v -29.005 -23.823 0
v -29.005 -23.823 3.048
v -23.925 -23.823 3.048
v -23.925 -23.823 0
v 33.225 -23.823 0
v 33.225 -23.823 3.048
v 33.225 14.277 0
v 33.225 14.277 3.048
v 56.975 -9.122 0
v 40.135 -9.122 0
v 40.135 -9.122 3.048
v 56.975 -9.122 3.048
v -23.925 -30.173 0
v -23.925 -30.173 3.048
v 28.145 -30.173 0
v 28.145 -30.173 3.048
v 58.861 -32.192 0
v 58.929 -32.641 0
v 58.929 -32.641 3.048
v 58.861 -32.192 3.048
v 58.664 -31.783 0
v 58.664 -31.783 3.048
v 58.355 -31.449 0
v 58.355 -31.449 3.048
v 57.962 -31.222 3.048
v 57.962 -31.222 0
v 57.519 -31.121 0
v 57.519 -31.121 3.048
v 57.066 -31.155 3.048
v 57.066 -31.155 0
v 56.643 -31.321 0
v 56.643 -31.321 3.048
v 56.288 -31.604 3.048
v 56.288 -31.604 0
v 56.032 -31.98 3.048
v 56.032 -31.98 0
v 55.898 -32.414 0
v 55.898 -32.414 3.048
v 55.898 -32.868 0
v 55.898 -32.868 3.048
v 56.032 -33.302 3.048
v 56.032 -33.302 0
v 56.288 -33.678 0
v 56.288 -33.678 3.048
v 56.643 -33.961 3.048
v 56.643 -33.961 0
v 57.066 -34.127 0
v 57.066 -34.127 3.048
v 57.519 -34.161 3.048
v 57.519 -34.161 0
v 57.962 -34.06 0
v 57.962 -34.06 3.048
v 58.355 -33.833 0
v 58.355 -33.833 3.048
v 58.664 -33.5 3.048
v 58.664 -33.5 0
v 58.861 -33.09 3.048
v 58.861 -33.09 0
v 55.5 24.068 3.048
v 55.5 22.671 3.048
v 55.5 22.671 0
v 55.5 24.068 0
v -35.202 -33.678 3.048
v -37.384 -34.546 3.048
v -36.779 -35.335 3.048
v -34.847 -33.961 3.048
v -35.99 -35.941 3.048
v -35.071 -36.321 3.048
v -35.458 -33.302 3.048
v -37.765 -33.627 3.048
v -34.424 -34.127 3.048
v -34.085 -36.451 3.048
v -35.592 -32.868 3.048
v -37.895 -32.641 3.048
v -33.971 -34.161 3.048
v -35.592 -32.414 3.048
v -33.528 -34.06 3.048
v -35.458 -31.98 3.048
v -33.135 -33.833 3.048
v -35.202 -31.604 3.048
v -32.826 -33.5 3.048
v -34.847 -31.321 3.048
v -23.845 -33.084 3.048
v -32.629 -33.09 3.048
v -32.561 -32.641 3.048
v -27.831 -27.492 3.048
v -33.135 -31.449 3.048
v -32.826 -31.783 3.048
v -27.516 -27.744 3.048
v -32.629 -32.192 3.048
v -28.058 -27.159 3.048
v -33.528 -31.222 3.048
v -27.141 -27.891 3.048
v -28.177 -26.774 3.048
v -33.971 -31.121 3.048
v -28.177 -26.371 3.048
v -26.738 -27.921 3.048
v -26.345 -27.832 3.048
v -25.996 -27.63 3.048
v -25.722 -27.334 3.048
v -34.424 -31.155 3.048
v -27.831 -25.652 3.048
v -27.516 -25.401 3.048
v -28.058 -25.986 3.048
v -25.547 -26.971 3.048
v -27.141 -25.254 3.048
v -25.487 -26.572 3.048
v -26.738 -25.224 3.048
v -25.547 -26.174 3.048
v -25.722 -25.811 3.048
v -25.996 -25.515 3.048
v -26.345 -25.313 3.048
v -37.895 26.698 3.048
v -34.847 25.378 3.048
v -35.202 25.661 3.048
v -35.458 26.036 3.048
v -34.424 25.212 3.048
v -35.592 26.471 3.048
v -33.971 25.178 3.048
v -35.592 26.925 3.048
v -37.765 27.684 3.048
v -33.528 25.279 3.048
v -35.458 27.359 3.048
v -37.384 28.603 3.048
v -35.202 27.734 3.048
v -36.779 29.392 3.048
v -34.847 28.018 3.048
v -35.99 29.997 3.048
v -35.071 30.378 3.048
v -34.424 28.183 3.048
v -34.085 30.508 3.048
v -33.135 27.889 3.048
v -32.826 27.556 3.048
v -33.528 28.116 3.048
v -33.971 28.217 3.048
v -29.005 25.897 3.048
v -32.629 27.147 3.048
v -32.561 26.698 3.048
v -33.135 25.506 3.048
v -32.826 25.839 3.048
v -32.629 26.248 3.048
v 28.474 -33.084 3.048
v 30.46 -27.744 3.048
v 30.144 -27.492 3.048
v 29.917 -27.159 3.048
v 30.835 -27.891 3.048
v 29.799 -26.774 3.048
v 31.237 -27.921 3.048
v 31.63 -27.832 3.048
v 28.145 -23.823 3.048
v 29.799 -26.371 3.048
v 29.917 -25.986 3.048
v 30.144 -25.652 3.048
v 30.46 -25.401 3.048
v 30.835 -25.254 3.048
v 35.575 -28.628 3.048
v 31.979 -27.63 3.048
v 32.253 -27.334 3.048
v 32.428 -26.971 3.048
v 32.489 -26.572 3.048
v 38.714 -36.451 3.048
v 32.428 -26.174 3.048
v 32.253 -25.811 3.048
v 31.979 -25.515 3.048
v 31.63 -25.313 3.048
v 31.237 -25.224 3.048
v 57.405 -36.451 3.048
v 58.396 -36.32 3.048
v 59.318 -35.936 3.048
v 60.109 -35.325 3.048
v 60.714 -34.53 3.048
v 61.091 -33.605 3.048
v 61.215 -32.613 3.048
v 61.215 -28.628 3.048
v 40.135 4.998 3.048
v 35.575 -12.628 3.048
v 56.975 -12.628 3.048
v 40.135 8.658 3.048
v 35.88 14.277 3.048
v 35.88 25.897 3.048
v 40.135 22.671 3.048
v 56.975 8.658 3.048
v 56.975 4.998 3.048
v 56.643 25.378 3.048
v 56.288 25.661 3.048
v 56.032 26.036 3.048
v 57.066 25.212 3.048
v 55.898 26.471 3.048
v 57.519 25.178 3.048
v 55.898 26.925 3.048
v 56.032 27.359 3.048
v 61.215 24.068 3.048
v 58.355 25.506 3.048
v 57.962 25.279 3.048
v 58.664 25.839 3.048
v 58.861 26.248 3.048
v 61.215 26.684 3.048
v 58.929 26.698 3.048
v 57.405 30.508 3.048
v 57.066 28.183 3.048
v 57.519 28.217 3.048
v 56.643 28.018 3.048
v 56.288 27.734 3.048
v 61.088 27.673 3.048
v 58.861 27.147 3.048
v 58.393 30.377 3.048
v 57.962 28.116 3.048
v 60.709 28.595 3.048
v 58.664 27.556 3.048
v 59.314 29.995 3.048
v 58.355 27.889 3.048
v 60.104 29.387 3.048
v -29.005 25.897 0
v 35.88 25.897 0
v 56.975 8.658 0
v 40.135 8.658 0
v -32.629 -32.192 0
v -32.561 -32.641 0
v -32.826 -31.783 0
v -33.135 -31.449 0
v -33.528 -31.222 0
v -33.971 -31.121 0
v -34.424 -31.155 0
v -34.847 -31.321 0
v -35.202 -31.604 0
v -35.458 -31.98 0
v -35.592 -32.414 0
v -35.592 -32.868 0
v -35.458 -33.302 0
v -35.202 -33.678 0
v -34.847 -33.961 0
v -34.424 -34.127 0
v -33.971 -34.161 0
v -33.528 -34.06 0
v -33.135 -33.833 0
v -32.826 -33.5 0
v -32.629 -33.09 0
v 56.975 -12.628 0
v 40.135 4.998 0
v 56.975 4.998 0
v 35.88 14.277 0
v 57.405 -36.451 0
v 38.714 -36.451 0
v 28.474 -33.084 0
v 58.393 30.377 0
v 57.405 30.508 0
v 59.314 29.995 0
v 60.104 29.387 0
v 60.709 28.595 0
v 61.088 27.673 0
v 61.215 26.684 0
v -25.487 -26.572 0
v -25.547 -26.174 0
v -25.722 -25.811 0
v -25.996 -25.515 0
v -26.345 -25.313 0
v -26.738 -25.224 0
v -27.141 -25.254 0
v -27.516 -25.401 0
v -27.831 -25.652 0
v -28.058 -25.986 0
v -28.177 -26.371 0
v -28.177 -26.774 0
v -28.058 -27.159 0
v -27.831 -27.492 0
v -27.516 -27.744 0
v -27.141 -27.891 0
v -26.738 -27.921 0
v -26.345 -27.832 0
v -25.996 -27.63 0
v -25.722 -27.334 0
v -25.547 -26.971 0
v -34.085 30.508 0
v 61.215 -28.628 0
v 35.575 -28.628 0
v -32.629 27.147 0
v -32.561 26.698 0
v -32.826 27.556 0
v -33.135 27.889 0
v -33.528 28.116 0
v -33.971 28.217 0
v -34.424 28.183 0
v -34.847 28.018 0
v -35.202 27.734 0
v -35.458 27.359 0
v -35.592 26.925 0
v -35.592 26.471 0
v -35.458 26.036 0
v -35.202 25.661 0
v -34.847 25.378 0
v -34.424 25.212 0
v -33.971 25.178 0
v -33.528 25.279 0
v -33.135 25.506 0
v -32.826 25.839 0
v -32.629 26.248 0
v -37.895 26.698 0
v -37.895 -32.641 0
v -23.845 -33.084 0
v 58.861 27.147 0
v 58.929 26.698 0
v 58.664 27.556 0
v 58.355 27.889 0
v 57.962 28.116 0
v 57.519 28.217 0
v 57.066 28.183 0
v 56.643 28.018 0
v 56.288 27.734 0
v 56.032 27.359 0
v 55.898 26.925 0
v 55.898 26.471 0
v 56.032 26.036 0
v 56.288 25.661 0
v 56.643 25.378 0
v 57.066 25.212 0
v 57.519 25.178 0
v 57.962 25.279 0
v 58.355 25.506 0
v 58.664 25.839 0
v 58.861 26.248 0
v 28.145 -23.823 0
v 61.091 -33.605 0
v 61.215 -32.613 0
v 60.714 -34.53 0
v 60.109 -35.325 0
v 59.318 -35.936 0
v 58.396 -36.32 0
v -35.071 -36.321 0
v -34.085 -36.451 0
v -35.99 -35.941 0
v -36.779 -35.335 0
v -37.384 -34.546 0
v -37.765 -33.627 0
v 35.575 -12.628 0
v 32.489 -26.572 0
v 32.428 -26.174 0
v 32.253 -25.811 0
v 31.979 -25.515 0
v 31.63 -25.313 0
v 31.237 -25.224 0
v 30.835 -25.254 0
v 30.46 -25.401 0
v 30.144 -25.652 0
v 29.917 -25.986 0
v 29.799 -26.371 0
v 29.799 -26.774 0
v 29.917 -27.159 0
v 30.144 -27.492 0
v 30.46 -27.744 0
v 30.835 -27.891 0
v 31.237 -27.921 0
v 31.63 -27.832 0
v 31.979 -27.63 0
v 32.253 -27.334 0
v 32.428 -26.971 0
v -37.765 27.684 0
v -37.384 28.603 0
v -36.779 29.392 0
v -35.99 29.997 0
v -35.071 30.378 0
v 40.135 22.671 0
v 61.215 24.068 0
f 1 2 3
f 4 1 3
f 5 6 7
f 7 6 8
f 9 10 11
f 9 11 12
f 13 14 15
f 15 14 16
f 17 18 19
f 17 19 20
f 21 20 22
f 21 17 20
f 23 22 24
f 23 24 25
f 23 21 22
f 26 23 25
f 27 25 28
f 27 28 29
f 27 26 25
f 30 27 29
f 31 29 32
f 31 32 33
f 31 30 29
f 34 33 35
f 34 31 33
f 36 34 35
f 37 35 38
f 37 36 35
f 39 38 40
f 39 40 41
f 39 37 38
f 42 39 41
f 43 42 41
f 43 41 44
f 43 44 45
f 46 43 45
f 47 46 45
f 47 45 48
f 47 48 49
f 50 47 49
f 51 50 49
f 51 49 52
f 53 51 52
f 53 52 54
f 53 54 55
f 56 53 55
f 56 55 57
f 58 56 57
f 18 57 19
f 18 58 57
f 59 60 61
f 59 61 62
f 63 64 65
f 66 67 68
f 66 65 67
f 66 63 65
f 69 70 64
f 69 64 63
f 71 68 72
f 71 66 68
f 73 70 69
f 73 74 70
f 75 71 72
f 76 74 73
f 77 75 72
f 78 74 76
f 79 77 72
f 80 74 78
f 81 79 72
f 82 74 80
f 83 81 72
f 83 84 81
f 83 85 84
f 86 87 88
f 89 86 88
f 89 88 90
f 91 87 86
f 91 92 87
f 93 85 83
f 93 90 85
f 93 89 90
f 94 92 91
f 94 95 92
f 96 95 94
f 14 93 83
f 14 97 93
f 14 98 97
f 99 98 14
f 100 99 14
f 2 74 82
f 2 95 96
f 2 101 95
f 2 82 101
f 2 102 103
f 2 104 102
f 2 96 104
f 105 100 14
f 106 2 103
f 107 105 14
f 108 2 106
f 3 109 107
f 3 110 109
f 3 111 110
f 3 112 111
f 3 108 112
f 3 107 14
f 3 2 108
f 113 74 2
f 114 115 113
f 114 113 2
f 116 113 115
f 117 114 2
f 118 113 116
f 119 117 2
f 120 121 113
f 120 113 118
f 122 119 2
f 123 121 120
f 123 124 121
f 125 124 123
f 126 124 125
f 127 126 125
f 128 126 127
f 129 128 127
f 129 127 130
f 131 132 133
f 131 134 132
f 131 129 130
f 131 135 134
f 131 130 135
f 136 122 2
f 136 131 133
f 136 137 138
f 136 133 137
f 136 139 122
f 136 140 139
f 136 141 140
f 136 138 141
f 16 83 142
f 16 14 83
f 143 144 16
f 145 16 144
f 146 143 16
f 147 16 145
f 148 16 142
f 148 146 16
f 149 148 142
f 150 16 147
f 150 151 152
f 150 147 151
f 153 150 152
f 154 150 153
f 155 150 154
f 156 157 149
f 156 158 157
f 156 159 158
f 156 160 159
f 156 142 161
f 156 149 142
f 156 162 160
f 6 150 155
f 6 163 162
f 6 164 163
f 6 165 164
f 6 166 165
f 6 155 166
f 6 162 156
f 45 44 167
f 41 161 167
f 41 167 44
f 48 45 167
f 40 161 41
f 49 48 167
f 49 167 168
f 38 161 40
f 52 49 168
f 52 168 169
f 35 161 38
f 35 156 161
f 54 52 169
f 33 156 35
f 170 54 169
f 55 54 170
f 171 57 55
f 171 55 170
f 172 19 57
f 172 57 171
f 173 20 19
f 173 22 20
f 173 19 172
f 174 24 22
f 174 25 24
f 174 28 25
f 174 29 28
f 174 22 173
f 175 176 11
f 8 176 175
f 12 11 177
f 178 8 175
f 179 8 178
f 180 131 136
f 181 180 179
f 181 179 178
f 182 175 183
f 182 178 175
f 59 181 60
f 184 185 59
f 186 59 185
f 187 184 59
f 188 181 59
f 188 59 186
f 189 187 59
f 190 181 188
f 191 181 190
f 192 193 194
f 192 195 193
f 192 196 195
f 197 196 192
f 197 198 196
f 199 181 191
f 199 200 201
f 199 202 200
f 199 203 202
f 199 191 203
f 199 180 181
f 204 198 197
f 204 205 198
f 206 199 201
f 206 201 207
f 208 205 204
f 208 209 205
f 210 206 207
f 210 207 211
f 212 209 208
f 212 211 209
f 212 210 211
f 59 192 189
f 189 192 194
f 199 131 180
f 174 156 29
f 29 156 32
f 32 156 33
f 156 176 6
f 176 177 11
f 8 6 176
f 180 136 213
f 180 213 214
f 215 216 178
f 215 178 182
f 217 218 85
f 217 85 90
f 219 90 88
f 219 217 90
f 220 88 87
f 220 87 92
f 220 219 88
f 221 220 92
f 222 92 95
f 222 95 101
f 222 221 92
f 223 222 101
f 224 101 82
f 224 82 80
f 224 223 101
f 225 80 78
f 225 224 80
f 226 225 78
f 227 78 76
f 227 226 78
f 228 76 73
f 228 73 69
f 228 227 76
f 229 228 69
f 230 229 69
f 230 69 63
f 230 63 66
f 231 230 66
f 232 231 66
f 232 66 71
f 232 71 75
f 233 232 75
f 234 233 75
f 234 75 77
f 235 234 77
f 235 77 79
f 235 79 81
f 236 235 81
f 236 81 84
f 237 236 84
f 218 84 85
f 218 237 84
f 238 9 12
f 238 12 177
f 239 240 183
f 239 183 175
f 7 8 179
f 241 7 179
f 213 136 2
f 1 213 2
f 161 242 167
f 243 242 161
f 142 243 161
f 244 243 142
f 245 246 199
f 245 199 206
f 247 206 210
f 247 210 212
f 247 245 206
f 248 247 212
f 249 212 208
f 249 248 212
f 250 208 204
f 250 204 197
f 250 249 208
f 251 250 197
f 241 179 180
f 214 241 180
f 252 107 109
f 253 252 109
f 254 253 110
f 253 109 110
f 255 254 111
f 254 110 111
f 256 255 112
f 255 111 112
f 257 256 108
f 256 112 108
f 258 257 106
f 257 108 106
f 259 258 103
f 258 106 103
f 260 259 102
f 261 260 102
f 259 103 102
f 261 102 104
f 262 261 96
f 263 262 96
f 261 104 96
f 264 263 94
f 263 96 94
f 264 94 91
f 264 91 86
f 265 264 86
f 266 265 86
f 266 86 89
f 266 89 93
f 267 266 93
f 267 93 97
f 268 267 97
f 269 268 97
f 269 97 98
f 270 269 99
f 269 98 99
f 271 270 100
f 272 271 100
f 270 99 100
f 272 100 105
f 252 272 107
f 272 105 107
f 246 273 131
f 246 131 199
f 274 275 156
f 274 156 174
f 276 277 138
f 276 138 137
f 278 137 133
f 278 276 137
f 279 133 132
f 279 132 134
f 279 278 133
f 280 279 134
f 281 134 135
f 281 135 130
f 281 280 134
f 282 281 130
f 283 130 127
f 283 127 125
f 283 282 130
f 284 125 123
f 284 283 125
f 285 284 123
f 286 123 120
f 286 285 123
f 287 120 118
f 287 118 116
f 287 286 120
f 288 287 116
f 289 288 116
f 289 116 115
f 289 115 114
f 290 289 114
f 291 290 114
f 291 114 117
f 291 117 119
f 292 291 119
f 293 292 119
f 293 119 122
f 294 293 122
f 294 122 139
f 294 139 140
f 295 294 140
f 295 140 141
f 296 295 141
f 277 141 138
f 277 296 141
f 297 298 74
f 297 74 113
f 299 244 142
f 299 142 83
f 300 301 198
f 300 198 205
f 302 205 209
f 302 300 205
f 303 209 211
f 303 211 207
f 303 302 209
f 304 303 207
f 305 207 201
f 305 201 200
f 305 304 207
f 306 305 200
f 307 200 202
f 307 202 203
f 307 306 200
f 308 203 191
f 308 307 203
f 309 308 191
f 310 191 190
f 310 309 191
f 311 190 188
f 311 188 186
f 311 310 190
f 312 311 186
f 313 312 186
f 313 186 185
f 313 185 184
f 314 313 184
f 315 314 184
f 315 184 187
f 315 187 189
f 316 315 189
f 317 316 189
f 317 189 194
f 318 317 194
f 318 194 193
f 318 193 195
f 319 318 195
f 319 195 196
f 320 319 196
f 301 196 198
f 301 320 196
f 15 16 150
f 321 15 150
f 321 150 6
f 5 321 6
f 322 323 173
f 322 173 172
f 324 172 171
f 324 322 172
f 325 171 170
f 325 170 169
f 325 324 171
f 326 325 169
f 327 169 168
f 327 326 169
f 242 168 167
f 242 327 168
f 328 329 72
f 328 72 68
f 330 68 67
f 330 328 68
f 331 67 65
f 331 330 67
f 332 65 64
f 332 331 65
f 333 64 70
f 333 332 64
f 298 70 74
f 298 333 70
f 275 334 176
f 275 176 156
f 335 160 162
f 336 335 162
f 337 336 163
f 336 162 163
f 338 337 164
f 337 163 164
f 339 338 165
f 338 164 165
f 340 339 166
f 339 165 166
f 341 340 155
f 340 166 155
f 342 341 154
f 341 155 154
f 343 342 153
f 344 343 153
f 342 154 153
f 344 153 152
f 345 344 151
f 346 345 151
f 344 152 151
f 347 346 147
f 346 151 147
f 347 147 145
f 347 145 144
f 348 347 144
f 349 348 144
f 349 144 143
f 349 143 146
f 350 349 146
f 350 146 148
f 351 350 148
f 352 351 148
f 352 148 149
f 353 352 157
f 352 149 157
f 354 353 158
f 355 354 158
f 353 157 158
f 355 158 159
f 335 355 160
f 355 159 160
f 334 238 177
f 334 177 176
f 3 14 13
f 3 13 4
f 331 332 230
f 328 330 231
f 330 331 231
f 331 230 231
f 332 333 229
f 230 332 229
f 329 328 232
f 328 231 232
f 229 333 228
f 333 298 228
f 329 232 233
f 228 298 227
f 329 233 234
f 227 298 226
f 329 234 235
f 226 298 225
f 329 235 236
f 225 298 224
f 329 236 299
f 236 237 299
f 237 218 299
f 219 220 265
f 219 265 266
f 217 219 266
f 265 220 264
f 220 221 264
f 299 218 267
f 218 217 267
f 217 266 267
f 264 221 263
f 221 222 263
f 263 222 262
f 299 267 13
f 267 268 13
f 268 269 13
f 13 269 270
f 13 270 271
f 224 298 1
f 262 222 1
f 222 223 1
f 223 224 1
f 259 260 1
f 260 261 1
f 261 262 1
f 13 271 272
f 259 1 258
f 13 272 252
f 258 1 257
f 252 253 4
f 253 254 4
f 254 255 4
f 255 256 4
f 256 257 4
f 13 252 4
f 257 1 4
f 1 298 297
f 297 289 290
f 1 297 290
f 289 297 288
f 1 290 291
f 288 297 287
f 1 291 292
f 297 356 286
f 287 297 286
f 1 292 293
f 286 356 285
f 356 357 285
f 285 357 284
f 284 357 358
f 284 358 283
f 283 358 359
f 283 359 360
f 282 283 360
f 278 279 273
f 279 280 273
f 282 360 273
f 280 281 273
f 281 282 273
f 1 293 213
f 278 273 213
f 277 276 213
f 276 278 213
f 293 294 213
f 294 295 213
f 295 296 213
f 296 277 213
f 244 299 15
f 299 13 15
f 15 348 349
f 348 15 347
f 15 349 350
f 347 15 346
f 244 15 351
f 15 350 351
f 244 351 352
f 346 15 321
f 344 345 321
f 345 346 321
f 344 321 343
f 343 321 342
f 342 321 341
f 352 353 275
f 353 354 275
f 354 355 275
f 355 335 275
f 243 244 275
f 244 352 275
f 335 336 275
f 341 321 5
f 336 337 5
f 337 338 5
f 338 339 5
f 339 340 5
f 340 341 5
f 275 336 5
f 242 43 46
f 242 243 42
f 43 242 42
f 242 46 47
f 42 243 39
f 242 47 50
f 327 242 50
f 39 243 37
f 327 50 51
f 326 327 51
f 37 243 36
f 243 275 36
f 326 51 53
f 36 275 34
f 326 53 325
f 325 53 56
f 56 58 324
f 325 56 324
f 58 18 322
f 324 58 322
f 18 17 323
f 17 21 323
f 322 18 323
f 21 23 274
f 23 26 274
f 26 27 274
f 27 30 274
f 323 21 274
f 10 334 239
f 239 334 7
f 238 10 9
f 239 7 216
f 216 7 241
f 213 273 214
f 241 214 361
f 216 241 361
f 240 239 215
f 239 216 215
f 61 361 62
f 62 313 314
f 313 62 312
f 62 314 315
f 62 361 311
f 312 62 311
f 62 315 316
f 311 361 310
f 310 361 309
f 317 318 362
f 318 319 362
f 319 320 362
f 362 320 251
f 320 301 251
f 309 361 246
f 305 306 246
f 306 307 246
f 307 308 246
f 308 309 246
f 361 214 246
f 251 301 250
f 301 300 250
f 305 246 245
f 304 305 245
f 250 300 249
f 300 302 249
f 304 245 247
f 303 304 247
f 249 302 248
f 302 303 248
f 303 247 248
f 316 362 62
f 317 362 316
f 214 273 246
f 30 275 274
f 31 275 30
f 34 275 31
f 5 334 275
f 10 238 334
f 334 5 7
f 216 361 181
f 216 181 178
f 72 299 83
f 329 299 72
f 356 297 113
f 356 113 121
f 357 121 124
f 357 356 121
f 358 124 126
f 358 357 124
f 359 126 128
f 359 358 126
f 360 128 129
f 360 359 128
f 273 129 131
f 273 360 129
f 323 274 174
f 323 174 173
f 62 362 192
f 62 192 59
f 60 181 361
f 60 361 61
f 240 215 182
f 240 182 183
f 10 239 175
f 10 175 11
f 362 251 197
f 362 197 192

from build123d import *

# Parameters (mm, degrees)
SKETCH1_R           = 1.524
SKETCH1_W           = 60.6932
SKETCH1_H           = 7.81
SKETCH1_W_2         = 5.588
SKETCH1_H_2         = 23.368
SKETCH1_W_3         = 5.4034
SKETCH1_H_3         = 22.6066
BOSS_EXTRUDE1_DEPTH = 3.048
SKETCH2_R           = 10.922
SKETCH2_R_2         = 1.4986
CUT_EXTRUDE1_DEPTH  = 4.048
SKETCH3_W           = 60.6932
SKETCH3_H           = 56.8638
BOSS_EXTRUDE2_DEPTH = 3.048
SKETCH5_W           = 64.8849
SKETCH5_H           = 11.62
SKETCH5_R           = 2.7305
CUT_EXTRUDE3_DEPTH  = 4.048
SKETCH6_R           = 2.7305
SKETCH6_R_2         = 1.35255
BOSS_EXTRUDE3_DEPTH = 3.048
SKETCH7_W           = 15.3651
SKETCH7_H           = 1.397
BOSS_EXTRUDE4_DEPTH = 3.048
SKETCH8_W           = 52.07
SKETCH8_H           = 6.35
CUT_EXTRUDE4_DEPTH  = 4.048


with BuildPart() as part:
    # Sketch1 → Boss-Extrude1 (new body)
    with BuildSketch(Plane.XY):
        with BuildLine():
            Line((61.214907375, 24.068294304), (40.134807375, 24.068294304))
            Line((40.134807375, 24.068294304), (40.134807375, 8.658194304))
            Line((40.134807375, 8.658194304), (56.975007375, 8.658194304))
            Line((56.975007375, 8.658194304), (56.975007375, 4.997894304))
            Line((56.975007375, 4.997894304), (40.134807375, 4.997894304))
            Line((40.134807375, 4.997894304), (40.134807375, -9.121805696))
            Line((40.134807375, -9.121805696), (56.975007375, -9.121805696))
            Line((56.975007375, -9.121805696), (56.975007375, -12.628005696))
            Line((56.975007375, -12.628005696), (35.575007375, -12.628005696))
            Line((35.575007375, -12.628005696), (35.575007375, -28.627805696))
            Line((35.575007375, -28.627805696), (61.214907375, -28.627805696))
            Line((61.214907375, -28.627805696), (61.214907375, -32.613401529))
            ThreePointArc((61.214907375, -32.613401529), (60.108826144, -35.325305244), (57.405007375, -36.451005696))
            Line((57.405007375, -36.451005696), (38.714307375, -36.451005696))
            Line((38.714307375, -36.451005696), (28.474307375, -33.084405696))
            Line((28.474307375, -33.084405696), (-23.844892625, -33.084405696))
            Line((-23.844892625, -33.084405696), (-34.084892625, -36.451005696))
            ThreePointArc((-34.084892625, -36.451005696), (-36.778969461, -35.335082532), (-37.894892625, -32.641005696))
            Line((-37.894892625, -32.641005696), (-37.894892625, 26.697694304))
            ThreePointArc((-37.894892625, 26.697694304), (-36.778969461, 29.391771141), (-34.084892625, 30.507694304))
            Line((-34.084892625, 30.507694304), (57.404932375, 30.507694304))
            ThreePointArc((57.404932375, 30.507694304), (60.103884597, 29.386886916), (61.214907375, 26.683892153))
            Line((61.214907375, 26.683892153), (61.214907375, 24.068294304))
        make_face()
        with Locations((57.405007375, -32.641005696)):
            Circle(SKETCH1_R, mode=Mode.SUBTRACT)
        with Locations((-34.084892625, -32.641005696)):
            Circle(SKETCH1_R, mode=Mode.SUBTRACT)
        with Locations((-34.084892625, 26.697694304)):
            Circle(SKETCH1_R, mode=Mode.SUBTRACT)
        with Locations((57.404932375, 26.697694304)):
            Circle(SKETCH1_R, mode=Mode.SUBTRACT)
        with Locations((1.341707375, 21.991994304)):
            Rectangle(SKETCH1_W, SKETCH1_H, mode=Mode.SUBTRACT)
        with Locations((-26.210892625, -1.882805696)):
            Rectangle(SKETCH1_W_2, SKETCH1_H_2, mode=Mode.SUBTRACT)
        with Locations((16.546707375, -19.663505696)):
            Rectangle(SKETCH1_W_3, SKETCH1_H_3, mode=Mode.SUBTRACT)
    extrude(amount=BOSS_EXTRUDE1_DEPTH)

    # Sketch2 → Cut-Extrude1 (cut, through all)
    with BuildSketch(Plane.XY.offset(3.048)):
        with Locations((-0.302892625, -0.480305696)):
            Circle(SKETCH2_R)
        with Locations((-10.285092625, -10.462505696)):
            Circle(SKETCH2_R_2)
        with Locations((-10.285092625, 9.501894304)):
            Circle(SKETCH2_R_2)
        with Locations((9.679307375, -10.462505696)):
            Circle(SKETCH2_R_2)
        with Locations((9.679307375, 9.501894304)):
            Circle(SKETCH2_R_2)
    extrude(amount=-CUT_EXTRUDE1_DEPTH, mode=Mode.SUBTRACT)

    # Sketch3 → Boss-Extrude2 (add)
    with BuildSketch(Plane.XY.offset(3.048)):
        with Locations((1.341707375, -2.534905696)):
            Rectangle(SKETCH3_W, SKETCH3_H)
    extrude(amount=-BOSS_EXTRUDE2_DEPTH)

    # Sketch5 → Cut-Extrude3 (cut, through all)
    with BuildSketch(Plane.XY.offset(3.048)):
        with Locations((3.437557375, 20.086994304)):
            Rectangle(SKETCH5_W, SKETCH5_H)
        with Locations((-26.839542625, -26.572455696)):
            Circle(SKETCH5_R)
        with Locations((31.135957375, -26.572455696)):
            Circle(SKETCH5_R)
    extrude(amount=-CUT_EXTRUDE3_DEPTH, mode=Mode.SUBTRACT)

    # Sketch6 → Boss-Extrude3 (add)
    with BuildSketch(Plane.XY.offset(3.048)):
        with Locations((-26.839542625, -26.572455696)):
            Circle(SKETCH6_R)
        with Locations((-26.839542625, -26.572455696)):
            Circle(SKETCH6_R_2, mode=Mode.SUBTRACT)
        with Locations((31.135957375, -26.572455696)):
            Circle(SKETCH6_R)
        with Locations((31.135957375, -26.572455696)):
            Circle(SKETCH6_R_2, mode=Mode.SUBTRACT)
    extrude(amount=-BOSS_EXTRUDE3_DEPTH)

    # Sketch7 → Boss-Extrude4 (add)
    with BuildSketch(Plane.XY.offset(3.048)):
        with Locations((47.817357375, 23.369794304)):
            Rectangle(SKETCH7_W, SKETCH7_H)
    extrude(amount=-BOSS_EXTRUDE4_DEPTH)

    # Sketch8 → Cut-Extrude4 (cut, through all)
    with BuildSketch(Plane.XY.offset(3.048)):
        Polygon((-29.004892625, -23.823005696), (-23.924892625, -23.823005696), (28.145107375, -23.823005696), (33.225107375, -23.823005696), (33.225107375, 14.276994304), (-29.004892625, 14.276994304), align=None)
        with Locations((2.110107375, -26.998005696)):
            Rectangle(SKETCH8_W, SKETCH8_H)
    extrude(amount=-CUT_EXTRUDE4_DEPTH, mode=Mode.SUBTRACT)


solid = part.part
